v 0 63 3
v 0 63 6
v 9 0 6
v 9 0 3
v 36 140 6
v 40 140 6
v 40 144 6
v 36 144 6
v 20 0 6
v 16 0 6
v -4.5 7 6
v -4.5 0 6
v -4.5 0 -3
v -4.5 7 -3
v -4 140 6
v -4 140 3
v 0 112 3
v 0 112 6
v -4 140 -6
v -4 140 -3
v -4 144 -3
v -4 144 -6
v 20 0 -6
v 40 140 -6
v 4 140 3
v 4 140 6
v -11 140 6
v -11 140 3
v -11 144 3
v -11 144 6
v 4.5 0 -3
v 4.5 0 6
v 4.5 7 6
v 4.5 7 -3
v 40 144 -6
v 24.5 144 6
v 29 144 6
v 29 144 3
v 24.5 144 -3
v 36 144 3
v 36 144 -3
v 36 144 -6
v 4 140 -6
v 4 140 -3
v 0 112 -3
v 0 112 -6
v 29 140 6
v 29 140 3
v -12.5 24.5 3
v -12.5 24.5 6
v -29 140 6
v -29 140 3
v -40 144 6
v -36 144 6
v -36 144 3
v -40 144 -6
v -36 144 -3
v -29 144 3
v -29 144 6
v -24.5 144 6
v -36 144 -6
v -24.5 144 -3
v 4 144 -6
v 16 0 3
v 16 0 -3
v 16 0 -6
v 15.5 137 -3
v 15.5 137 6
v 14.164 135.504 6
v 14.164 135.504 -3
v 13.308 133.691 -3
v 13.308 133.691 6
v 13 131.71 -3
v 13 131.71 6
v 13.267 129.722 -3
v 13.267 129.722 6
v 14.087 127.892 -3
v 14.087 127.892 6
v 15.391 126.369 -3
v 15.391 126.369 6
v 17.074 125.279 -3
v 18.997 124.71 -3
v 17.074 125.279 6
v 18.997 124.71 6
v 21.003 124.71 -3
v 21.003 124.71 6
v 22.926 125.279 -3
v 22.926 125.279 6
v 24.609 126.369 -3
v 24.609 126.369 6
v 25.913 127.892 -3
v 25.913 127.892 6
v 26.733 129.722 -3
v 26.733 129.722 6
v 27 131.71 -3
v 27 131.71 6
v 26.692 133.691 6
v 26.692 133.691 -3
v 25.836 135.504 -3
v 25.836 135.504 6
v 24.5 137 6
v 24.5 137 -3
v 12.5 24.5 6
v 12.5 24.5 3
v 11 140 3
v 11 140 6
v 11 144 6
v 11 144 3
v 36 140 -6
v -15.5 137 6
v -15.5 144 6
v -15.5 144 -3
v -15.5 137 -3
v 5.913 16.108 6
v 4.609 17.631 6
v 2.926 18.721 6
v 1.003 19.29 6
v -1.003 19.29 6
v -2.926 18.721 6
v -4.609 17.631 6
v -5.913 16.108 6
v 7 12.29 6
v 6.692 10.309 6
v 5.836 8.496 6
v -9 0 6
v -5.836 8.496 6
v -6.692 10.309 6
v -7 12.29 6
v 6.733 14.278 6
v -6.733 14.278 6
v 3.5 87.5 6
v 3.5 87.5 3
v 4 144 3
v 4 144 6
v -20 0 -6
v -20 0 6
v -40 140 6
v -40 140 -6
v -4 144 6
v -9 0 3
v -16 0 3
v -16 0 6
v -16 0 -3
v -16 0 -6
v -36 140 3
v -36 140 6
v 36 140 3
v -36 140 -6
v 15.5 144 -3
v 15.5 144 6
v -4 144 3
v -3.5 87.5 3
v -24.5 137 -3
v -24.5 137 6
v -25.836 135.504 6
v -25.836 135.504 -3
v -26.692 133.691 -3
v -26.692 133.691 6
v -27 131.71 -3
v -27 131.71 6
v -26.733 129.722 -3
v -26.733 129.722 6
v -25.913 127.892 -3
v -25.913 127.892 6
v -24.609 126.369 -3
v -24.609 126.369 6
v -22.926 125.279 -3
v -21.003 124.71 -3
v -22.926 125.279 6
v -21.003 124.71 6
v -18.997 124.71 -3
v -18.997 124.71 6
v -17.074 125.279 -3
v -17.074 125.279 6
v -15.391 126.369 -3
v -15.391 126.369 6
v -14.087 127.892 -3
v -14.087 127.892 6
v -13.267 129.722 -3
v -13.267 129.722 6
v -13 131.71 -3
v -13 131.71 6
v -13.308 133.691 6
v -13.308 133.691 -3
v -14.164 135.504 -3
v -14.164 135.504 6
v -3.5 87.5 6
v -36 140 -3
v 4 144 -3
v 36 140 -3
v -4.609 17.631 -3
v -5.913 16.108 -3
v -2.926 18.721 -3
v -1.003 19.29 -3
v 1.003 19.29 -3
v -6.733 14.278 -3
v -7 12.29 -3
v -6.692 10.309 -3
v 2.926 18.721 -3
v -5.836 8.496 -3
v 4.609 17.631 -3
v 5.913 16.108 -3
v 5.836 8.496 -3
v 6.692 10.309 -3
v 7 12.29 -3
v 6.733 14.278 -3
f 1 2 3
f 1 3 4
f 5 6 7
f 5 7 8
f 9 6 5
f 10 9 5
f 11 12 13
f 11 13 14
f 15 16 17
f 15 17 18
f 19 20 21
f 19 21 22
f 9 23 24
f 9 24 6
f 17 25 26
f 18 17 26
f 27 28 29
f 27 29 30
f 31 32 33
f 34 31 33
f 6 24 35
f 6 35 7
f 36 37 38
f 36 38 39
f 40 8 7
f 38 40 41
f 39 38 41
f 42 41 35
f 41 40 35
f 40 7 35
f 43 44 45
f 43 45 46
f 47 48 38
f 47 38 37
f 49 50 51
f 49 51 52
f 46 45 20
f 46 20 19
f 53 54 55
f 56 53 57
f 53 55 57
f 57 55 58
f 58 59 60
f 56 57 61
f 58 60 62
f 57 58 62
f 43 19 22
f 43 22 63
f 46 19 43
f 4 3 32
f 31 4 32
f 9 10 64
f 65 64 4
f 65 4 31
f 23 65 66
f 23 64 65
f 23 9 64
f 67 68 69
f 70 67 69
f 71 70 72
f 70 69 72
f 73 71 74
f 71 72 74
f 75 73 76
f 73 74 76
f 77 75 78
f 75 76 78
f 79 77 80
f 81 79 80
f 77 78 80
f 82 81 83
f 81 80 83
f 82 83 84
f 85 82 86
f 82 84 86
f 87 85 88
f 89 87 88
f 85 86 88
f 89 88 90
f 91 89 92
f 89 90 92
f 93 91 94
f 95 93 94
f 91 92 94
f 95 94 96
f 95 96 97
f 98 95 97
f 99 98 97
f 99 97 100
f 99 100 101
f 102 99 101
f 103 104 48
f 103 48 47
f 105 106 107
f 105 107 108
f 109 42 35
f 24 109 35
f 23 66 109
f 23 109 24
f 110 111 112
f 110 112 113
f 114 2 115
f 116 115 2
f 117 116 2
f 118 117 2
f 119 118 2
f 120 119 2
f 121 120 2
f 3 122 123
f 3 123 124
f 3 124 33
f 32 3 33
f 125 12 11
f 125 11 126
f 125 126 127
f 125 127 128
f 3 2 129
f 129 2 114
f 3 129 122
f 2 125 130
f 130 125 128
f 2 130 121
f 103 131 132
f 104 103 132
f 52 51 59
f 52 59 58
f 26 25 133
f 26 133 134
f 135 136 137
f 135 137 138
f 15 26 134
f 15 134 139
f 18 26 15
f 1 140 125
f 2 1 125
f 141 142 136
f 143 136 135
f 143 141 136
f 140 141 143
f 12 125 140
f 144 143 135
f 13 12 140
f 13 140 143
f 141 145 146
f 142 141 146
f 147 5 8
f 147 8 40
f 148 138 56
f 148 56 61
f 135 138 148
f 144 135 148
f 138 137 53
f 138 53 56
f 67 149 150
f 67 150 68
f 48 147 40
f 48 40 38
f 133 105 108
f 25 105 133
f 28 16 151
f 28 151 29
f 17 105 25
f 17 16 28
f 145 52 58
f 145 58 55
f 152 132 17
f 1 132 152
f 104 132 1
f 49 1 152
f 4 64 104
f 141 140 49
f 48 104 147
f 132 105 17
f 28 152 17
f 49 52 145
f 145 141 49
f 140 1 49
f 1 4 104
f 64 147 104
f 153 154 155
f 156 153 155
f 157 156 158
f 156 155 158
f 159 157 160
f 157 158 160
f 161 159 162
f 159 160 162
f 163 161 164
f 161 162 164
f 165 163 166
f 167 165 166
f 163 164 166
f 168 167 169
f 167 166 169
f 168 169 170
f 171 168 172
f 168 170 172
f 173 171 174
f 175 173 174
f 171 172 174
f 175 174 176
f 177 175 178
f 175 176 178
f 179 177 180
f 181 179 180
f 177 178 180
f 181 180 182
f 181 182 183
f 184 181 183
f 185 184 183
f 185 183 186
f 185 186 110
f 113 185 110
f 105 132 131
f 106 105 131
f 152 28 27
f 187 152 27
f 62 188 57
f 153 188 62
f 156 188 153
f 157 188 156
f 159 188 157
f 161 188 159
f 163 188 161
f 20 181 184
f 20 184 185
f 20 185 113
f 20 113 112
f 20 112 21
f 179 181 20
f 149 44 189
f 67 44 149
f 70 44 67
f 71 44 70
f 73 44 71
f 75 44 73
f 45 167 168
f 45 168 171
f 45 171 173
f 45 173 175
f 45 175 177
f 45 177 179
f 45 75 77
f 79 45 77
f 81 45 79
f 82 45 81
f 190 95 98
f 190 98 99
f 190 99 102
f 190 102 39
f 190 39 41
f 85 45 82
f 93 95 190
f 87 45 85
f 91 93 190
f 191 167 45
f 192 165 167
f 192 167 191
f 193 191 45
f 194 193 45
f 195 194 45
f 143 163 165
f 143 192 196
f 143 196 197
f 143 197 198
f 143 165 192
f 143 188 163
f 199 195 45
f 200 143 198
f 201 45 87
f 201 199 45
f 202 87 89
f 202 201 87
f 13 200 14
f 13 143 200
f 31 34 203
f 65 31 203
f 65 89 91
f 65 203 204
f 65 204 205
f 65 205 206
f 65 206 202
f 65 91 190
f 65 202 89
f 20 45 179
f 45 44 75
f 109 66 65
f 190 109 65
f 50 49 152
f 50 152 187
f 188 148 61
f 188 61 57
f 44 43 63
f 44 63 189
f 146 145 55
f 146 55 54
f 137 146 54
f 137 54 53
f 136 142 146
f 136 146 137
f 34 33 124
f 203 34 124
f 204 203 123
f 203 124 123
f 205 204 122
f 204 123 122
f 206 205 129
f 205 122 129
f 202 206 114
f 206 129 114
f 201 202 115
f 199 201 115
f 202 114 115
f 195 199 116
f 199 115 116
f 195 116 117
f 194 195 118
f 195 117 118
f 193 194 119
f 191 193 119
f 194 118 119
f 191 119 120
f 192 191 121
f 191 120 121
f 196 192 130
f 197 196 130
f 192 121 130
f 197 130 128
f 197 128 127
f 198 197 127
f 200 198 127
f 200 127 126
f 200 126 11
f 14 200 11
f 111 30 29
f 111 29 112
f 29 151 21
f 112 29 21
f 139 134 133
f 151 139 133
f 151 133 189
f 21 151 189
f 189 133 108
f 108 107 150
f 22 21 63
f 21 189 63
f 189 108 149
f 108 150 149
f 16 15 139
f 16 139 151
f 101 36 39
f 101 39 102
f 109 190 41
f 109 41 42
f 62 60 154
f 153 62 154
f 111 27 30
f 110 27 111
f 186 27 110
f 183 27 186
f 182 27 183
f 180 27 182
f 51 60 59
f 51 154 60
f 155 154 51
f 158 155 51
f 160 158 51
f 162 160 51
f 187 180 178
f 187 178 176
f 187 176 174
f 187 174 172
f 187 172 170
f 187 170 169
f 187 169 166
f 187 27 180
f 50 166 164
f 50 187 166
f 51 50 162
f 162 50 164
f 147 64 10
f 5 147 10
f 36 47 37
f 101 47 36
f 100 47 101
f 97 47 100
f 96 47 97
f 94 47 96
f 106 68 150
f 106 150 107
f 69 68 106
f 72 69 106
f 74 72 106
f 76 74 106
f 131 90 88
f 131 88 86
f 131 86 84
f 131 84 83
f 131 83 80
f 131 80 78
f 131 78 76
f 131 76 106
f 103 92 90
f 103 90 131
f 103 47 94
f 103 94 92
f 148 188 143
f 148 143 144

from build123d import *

# Parameters (mm, degrees)
SKETCH004_W          = 32
SKETCH004_H          = 3
SKETCH005_W          = 7
SKETCH005_H          = 3
SKETCH006_W          = 7
SKETCH006_H          = 3
POCKET_DEPTH         = 6.001
POCKET_DEPTH_BACK    = -6.001
POCKET001_DEPTH      = 6.001
POCKET001_DEPTH_BACK = -6.001
POCKET002_DEPTH      = 6.001
POCKET002_DEPTH_BACK = -6.001


with BuildPart() as part:
    # AdditivePipe: sweep along a path in Sketch
    with BuildLine(Plane.XY) as additivepipe_path:
        Line((-20, 144), (-20, 140))
        Line((-20, 140), (0, 0))
    # Sketch002 → AdditivePipe (sweep)
    with BuildSketch(Plane.XZ):
        Polygon((-20, 6), (-20, -6), (-16, -6), (-16, -3), (-9, -3), (9, -3), (16, -3), (16, -6), (20, -6), (20, 6), (16, 6), (16, 3), (9, 3), (9, 6), (-9, 6), (-9, 3), (-16, 3), (-16, 6), align=None)
    sweep(path=additivepipe_path.line)

    # AdditivePipe001: sweep along a path in Sketch001
    with BuildLine(Plane.XY) as additivepipe001_path:
        Line((20, 144), (20, 140))
        Line((20, 140), (0, 0))
    # Sketch002 → AdditivePipe001 (sweep)
    with BuildSketch(Plane.XZ):
        Polygon((-20, 6), (-20, -6), (-16, -6), (-16, -3), (-9, -3), (9, -3), (16, -3), (16, -6), (20, -6), (20, 6), (16, 6), (16, 3), (9, 3), (9, 6), (-9, 6), (-9, 3), (-16, 3), (-16, 6), align=None)
    sweep(path=additivepipe001_path.line)

    # SubtractivePipe: sweep along a path in Sketch
    with BuildLine(Plane.XY) as subtractivepipe_path:
        Line((-20, 144), (-20, 140))
        Line((-20, 140), (0, 0))
    # Sketch004 → SubtractivePipe (sweep, cut)
    with BuildSketch(Plane.XZ):
        with Locations((0, -4.5)):
            Rectangle(SKETCH004_W, SKETCH004_H)
    sweep(path=subtractivepipe_path.line, mode=Mode.SUBTRACT)

    # SubtractivePipe001: sweep along a path in Sketch001
    with BuildLine(Plane.XY) as subtractivepipe001_path:
        Line((20, 144), (20, 140))
        Line((20, 140), (0, 0))
    # Sketch004 → SubtractivePipe001 (sweep, cut)
    with BuildSketch(Plane.XZ):
        with Locations((0, -4.5)):
            Rectangle(SKETCH004_W, SKETCH004_H)
    sweep(path=subtractivepipe001_path.line, mode=Mode.SUBTRACT)

    # SubtractivePipe002: sweep along a path in Sketch
    with BuildLine(Plane.XY) as subtractivepipe002_path:
        Line((-20, 144), (-20, 140))
        Line((-20, 140), (0, 0))
    # Sketch005 → SubtractivePipe002 (sweep, cut)
    with BuildSketch(Plane.XZ):
        with Locations((-12.5, 4.5)):
            Rectangle(SKETCH005_W, SKETCH005_H)
    sweep(path=subtractivepipe002_path.line, mode=Mode.SUBTRACT)

    # SubtractivePipe003: sweep along a path in Sketch001
    with BuildLine(Plane.XY) as subtractivepipe003_path:
        Line((20, 144), (20, 140))
        Line((20, 140), (0, 0))
    # Sketch005 → SubtractivePipe003 (sweep, cut)
    with BuildSketch(Plane.XZ):
        with Locations((-12.5, 4.5)):
            Rectangle(SKETCH005_W, SKETCH005_H)
    sweep(path=subtractivepipe003_path.line, mode=Mode.SUBTRACT)

    # SubtractivePipe004: sweep along a path in Sketch
    with BuildLine(Plane.XY) as subtractivepipe004_path:
        Line((-20, 144), (-20, 140))
        Line((-20, 140), (0, 0))
    # Sketch006 → SubtractivePipe004 (sweep, cut)
    with BuildSketch(Plane.XZ):
        with Locations((12.5, 4.5)):
            Rectangle(SKETCH006_W, SKETCH006_H)
    sweep(path=subtractivepipe004_path.line, mode=Mode.SUBTRACT)

    # SubtractivePipe005: sweep along a path in Sketch001
    with BuildLine(Plane.XY) as subtractivepipe005_path:
        Line((20, 144), (20, 140))
        Line((20, 140), (0, 0))
    # Sketch006 → SubtractivePipe005 (sweep, cut)
    with BuildSketch(Plane.XZ):
        with Locations((12.5, 4.5)):
            Rectangle(SKETCH006_W, SKETCH006_H)
    sweep(path=subtractivepipe005_path.line, mode=Mode.SUBTRACT)

    # Sketch003 → Pocket (cut, two sides)
    with BuildSketch(Plane.XY) as pocket_sk:
        with BuildLine():
            Line((-4.5, 0), (4.5, 0))
            Line((4.5, 0), (4.5, 7))
            ThreePointArc((4.5, 7), (0, 19.361903), (-4.5, 7))
            Line((-4.5, 0), (-4.5, 7))
        make_face()
    extrude(amount=-POCKET_DEPTH, mode=Mode.SUBTRACT)
    extrude(pocket_sk.sketch, amount=-POCKET_DEPTH_BACK, mode=Mode.SUBTRACT)

    # Sketch007 → Pocket001 (cut, two sides)
    with BuildSketch(Plane.XY) as pocket001_sk:
        with BuildLine():
            Line((-24.5, 144), (-15.5, 144))
            Line((-15.5, 144), (-15.5, 137))
            ThreePointArc((-24.5, 137), (-20, 124.638097), (-15.5, 137))
            Line((-24.5, 144), (-24.5, 137))
        make_face()
    extrude(amount=-POCKET001_DEPTH, mode=Mode.SUBTRACT)
    extrude(pocket001_sk.sketch, amount=-POCKET001_DEPTH_BACK, mode=Mode.SUBTRACT)

    # Sketch008 → Pocket002 (cut, two sides)
    with BuildSketch(Plane.XY) as pocket002_sk:
        with BuildLine():
            Line((15.5, 144), (24.5, 144))
            Line((24.5, 144), (24.5, 137))
            ThreePointArc((15.5, 137), (20, 124.638097), (24.5, 137))
            Line((15.5, 144), (15.5, 137))
        make_face()
    extrude(amount=-POCKET002_DEPTH, mode=Mode.SUBTRACT)
    extrude(pocket002_sk.sketch, amount=-POCKET002_DEPTH_BACK, mode=Mode.SUBTRACT)


solid = part.part
